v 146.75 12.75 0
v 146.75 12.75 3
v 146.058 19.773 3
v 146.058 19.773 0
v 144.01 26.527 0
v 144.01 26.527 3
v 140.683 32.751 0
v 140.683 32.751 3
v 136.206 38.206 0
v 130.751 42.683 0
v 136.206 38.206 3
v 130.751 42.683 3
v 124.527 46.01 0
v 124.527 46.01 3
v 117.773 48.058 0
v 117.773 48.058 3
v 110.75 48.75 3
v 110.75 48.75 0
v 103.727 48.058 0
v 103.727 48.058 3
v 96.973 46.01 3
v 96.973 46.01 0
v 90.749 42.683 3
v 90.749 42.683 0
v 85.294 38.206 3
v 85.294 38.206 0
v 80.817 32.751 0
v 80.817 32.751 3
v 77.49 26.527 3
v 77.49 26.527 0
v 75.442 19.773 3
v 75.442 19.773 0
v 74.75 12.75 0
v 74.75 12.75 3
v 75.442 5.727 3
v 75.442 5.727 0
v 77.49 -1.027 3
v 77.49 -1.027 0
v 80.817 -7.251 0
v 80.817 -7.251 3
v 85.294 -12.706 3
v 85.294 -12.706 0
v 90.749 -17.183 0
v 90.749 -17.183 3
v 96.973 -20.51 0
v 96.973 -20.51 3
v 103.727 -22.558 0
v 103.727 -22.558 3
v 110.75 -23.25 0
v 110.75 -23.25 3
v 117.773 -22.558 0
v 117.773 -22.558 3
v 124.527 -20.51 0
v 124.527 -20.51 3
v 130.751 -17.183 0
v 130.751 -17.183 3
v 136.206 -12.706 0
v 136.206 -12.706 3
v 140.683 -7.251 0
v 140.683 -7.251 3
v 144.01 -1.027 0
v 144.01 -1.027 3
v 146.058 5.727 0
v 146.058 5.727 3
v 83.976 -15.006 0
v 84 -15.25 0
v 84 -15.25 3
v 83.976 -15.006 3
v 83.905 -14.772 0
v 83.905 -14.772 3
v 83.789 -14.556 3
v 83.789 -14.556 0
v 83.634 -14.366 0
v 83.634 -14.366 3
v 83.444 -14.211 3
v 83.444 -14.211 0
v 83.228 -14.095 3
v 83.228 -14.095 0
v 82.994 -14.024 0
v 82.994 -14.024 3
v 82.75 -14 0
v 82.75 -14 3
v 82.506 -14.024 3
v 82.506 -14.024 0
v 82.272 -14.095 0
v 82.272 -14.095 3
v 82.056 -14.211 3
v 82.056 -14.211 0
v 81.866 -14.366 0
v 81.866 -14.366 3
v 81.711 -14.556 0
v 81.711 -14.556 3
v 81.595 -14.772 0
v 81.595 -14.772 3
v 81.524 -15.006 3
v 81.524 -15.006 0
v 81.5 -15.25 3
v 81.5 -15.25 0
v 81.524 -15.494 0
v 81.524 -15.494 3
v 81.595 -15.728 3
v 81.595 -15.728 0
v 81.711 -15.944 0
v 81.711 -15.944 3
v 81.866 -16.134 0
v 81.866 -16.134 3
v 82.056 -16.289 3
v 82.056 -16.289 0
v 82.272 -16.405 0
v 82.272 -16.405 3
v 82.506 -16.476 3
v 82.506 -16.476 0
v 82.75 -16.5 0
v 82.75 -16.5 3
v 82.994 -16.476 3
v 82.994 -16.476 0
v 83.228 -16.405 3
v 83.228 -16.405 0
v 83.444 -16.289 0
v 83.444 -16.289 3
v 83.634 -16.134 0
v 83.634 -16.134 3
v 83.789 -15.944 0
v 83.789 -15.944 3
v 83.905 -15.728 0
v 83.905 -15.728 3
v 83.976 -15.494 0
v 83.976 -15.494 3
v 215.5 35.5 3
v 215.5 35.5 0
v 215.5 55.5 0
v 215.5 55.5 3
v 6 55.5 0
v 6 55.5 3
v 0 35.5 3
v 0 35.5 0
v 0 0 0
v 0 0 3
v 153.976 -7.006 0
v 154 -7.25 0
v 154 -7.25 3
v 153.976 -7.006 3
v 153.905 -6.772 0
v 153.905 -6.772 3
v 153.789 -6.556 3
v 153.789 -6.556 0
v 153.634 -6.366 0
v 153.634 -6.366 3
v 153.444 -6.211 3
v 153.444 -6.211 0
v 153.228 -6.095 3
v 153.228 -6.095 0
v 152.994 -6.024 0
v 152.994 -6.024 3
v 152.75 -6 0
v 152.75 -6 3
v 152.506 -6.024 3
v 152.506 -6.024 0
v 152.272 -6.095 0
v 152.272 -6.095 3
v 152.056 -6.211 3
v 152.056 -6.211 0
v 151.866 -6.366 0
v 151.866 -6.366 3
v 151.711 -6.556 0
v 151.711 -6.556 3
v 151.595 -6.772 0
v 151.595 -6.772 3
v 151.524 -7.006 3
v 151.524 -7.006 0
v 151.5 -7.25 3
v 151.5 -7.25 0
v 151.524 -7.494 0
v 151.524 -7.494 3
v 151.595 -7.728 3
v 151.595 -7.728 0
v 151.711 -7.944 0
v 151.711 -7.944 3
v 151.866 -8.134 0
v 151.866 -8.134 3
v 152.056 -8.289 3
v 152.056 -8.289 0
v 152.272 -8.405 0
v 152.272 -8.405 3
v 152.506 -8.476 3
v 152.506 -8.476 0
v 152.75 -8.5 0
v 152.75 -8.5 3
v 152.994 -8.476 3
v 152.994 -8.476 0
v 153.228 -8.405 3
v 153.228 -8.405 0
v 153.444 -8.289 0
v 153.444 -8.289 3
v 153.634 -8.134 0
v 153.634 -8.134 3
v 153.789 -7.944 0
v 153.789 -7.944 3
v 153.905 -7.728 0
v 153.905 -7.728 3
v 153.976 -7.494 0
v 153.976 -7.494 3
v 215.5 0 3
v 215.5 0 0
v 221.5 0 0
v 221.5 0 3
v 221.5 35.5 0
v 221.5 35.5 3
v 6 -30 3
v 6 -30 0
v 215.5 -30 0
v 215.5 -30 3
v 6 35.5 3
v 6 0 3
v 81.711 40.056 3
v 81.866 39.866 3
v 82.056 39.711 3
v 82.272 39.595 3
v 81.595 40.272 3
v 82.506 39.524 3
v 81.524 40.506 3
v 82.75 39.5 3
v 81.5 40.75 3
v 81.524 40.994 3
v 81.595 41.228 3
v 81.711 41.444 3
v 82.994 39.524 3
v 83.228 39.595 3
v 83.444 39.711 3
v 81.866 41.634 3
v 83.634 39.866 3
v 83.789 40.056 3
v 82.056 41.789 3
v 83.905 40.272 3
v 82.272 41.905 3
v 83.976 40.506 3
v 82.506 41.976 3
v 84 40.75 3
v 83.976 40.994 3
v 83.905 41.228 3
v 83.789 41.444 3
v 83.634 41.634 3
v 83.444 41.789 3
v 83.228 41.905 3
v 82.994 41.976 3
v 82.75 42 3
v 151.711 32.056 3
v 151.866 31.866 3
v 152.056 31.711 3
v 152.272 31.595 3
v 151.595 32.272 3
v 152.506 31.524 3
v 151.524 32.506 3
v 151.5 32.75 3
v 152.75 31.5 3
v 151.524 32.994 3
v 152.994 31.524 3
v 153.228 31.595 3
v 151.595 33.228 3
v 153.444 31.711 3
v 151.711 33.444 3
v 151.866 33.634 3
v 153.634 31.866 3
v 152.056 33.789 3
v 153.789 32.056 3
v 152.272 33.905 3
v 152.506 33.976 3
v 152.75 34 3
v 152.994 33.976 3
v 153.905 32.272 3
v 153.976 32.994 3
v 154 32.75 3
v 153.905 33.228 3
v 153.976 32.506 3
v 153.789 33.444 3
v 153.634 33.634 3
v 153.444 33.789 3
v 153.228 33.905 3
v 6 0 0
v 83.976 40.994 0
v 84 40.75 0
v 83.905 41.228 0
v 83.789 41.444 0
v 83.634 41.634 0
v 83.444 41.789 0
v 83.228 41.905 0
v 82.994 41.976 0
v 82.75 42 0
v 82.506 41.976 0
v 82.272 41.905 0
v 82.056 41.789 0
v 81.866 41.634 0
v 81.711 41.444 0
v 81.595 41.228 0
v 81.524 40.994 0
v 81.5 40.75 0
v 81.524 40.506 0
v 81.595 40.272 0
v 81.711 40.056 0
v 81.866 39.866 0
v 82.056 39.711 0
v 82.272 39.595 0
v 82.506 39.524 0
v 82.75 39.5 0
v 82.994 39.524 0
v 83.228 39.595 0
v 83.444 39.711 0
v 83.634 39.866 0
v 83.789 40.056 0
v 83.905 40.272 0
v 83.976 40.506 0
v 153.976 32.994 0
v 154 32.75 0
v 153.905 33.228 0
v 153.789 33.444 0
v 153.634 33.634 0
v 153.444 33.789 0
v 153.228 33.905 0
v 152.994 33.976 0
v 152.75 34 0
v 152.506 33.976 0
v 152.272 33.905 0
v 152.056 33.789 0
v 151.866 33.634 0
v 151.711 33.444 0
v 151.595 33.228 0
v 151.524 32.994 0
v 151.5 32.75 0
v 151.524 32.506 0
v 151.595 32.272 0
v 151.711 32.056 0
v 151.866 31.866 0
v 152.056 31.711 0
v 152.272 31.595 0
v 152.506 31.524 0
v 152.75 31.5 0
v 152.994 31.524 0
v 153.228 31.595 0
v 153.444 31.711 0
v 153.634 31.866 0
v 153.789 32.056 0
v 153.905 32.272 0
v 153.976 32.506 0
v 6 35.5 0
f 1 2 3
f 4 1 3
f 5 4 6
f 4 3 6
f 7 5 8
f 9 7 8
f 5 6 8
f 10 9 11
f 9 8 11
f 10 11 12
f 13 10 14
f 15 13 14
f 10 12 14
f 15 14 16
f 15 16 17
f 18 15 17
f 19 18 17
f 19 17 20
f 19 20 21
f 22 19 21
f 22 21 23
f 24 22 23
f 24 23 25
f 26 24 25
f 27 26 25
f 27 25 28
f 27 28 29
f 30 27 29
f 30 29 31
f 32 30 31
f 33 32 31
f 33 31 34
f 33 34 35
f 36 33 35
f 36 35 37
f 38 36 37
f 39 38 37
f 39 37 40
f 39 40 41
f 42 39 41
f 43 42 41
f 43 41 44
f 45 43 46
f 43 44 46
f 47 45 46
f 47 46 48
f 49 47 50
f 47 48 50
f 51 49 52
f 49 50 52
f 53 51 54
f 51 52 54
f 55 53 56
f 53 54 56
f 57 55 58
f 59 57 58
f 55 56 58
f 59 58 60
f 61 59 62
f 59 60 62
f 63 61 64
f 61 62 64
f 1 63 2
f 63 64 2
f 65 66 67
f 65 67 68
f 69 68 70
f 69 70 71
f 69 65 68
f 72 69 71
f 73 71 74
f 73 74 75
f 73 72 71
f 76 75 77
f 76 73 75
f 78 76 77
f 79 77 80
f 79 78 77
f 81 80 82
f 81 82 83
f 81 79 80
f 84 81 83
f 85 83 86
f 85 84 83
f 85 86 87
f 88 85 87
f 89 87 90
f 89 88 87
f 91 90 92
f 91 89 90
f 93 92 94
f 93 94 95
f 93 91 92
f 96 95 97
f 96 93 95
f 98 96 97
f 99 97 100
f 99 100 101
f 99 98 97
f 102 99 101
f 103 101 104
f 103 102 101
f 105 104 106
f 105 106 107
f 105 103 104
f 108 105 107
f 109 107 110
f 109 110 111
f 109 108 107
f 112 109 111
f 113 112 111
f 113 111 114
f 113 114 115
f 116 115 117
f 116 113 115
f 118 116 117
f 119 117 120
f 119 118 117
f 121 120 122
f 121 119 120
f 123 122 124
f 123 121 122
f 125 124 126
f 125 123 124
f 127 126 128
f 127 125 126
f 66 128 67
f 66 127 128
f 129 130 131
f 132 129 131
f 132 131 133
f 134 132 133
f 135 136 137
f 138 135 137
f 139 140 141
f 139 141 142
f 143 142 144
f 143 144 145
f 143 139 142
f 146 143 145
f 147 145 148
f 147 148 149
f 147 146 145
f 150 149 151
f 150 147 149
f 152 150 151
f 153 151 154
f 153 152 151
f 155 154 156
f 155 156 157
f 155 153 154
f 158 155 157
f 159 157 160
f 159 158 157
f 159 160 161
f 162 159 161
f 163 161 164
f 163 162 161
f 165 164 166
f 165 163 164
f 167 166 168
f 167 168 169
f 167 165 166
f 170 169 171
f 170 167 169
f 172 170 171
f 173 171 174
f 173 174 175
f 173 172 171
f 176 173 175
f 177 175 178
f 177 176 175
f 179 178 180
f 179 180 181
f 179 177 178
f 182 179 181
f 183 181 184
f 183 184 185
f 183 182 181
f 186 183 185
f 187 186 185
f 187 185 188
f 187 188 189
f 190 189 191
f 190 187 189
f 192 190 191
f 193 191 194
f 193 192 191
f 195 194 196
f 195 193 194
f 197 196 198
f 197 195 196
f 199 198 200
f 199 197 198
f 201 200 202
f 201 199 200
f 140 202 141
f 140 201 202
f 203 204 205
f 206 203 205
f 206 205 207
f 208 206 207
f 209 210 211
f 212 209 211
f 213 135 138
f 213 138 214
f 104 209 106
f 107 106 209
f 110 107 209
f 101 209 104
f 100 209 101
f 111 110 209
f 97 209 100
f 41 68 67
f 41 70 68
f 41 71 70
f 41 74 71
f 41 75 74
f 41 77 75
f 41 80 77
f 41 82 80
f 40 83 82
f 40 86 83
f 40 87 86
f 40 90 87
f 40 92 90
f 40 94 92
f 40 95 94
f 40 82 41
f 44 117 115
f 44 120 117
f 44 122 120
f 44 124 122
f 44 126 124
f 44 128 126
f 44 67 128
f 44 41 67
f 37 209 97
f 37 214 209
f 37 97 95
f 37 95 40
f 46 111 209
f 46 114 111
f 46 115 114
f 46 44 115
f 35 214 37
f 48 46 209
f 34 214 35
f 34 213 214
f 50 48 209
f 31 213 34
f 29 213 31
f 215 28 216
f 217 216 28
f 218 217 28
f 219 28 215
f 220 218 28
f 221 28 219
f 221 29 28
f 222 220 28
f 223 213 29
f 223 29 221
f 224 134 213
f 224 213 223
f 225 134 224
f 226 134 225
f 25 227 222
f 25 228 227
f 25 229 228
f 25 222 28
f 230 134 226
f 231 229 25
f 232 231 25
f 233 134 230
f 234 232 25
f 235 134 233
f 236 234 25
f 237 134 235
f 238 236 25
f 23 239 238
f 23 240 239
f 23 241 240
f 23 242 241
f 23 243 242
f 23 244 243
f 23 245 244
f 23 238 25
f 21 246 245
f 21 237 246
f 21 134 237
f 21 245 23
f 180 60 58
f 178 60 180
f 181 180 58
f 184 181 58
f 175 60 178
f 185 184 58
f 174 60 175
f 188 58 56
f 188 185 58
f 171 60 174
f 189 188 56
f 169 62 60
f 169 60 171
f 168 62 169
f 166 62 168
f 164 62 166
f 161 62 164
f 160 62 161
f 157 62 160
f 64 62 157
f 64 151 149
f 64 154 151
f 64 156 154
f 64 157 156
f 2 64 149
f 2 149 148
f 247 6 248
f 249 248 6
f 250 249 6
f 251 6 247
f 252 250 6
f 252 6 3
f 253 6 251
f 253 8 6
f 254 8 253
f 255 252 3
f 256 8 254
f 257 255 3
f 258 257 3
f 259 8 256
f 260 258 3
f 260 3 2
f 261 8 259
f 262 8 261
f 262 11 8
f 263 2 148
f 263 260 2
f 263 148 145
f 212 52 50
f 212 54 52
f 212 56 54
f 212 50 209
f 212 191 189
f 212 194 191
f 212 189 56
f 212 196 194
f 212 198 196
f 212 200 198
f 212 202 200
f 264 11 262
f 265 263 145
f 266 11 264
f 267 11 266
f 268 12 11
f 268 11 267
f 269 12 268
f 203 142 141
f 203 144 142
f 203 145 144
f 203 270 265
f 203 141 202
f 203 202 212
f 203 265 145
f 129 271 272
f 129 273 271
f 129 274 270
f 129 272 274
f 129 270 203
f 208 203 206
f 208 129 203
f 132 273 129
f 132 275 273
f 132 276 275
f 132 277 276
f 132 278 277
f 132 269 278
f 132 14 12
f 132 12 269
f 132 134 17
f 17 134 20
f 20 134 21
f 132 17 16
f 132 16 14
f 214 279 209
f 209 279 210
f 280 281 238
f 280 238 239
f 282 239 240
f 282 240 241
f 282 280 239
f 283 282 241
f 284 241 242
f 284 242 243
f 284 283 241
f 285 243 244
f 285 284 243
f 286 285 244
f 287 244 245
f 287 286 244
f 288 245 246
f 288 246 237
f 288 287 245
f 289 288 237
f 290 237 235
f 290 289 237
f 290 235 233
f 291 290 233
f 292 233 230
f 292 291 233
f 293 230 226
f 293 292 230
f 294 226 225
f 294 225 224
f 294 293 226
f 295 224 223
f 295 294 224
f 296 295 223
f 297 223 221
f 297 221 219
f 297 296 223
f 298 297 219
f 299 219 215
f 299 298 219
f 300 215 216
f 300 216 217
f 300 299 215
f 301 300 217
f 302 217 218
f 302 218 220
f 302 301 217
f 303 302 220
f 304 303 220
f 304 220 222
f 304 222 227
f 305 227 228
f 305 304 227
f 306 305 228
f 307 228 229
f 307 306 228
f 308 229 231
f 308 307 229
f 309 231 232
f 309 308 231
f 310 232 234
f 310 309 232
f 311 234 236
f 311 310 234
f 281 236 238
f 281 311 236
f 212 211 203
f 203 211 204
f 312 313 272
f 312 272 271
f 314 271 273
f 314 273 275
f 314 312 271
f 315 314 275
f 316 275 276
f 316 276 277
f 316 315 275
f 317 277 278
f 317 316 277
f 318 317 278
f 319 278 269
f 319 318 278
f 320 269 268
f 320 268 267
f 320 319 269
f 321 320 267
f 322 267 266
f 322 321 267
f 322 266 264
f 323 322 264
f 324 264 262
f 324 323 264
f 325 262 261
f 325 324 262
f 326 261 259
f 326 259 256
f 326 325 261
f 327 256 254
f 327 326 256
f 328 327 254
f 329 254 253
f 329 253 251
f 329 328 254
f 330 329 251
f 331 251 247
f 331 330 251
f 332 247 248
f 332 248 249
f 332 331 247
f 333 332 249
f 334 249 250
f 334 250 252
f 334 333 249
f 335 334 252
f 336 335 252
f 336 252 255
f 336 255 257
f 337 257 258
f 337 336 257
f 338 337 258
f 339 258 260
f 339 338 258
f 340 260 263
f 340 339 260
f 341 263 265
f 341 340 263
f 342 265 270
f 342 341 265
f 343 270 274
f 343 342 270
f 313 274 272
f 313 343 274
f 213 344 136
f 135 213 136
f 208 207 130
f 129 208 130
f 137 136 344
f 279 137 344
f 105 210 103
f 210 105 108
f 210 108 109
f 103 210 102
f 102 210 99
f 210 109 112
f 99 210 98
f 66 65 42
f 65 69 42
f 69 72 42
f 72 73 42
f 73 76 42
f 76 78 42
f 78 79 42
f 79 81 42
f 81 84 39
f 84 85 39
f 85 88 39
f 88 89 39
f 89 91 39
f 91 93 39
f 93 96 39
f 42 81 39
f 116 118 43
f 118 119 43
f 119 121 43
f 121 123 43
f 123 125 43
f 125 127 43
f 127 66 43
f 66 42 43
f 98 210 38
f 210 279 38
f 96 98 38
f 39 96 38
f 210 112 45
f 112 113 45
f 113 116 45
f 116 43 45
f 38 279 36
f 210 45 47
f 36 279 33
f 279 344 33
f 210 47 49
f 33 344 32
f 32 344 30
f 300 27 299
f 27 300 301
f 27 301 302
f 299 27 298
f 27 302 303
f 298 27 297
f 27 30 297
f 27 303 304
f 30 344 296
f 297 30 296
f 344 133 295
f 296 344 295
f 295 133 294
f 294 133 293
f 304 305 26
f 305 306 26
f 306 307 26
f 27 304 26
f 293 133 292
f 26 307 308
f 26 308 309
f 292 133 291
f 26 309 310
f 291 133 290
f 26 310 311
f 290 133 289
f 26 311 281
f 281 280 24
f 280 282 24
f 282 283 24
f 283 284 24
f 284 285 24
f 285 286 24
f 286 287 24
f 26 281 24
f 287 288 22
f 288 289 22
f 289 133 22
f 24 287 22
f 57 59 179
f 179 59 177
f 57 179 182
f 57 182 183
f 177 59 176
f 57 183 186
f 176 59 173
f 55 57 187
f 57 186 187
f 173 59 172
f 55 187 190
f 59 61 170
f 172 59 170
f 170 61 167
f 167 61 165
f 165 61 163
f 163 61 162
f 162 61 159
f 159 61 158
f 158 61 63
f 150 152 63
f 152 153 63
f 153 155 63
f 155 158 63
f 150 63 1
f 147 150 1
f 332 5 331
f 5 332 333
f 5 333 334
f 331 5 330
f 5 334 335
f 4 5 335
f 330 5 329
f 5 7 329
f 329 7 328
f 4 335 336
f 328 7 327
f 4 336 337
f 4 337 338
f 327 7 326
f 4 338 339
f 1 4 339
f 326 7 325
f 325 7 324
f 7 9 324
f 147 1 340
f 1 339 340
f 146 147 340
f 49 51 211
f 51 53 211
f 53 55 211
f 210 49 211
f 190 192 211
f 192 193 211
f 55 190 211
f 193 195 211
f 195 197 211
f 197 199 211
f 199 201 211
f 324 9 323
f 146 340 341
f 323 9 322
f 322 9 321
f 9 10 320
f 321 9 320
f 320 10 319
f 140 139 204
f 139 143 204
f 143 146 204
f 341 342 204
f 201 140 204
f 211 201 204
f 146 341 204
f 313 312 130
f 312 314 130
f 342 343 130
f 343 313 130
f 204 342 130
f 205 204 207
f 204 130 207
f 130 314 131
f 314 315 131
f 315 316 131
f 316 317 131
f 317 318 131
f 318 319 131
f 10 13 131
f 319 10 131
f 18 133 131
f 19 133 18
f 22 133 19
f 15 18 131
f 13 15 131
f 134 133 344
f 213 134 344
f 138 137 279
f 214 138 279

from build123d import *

# Parameters (mm, degrees)
BOSS_EXTRUDE1_DEPTH = 3
SKETCH2_R           = 36
CUT_EXTRUDE1_DEPTH  = 229.367029144
CAVITY1_OUTLINE_R   = 1.25
CAVITY1_DEPTH       = 3


# Read off the part's stored shape, not the designer's step: Cavity1
with BuildPart() as part:
    # Sketch1 → Boss-Extrude1 (new body)
    with BuildSketch(Plane.XY):
        Polygon((6, -30), (215.5, -30), (215.5, 0), (221.5, 0), (221.5, 35.5), (215.5, 35.5), (215.5, 55.5), (6, 55.5), (6, 35.5), (0, 35.5), (0, 0), (6, 0), align=None)
    extrude(amount=BOSS_EXTRUDE1_DEPTH)

    # Sketch2 → Cut-Extrude1 (cut, through all)
    with BuildSketch(Plane.XY.offset(3)):
        with Locations((110.75, 12.75)):
            Circle(SKETCH2_R)
    extrude(amount=-CUT_EXTRUDE1_DEPTH, mode=Mode.SUBTRACT)

    # Cavity1 outline → Cavity1 (cut)
    with BuildSketch(Plane.XY):
        with Locations((152.75, 32.75)):
            Circle(CAVITY1_OUTLINE_R)
        with Locations((152.75, -7.25)):
            Circle(CAVITY1_OUTLINE_R)
        with Locations((82.75, -15.25)):
            Circle(CAVITY1_OUTLINE_R)
        with Locations((82.75, 40.75)):
            Circle(CAVITY1_OUTLINE_R)
    extrude(amount=CAVITY1_DEPTH, mode=Mode.SUBTRACT)


solid = part.part
